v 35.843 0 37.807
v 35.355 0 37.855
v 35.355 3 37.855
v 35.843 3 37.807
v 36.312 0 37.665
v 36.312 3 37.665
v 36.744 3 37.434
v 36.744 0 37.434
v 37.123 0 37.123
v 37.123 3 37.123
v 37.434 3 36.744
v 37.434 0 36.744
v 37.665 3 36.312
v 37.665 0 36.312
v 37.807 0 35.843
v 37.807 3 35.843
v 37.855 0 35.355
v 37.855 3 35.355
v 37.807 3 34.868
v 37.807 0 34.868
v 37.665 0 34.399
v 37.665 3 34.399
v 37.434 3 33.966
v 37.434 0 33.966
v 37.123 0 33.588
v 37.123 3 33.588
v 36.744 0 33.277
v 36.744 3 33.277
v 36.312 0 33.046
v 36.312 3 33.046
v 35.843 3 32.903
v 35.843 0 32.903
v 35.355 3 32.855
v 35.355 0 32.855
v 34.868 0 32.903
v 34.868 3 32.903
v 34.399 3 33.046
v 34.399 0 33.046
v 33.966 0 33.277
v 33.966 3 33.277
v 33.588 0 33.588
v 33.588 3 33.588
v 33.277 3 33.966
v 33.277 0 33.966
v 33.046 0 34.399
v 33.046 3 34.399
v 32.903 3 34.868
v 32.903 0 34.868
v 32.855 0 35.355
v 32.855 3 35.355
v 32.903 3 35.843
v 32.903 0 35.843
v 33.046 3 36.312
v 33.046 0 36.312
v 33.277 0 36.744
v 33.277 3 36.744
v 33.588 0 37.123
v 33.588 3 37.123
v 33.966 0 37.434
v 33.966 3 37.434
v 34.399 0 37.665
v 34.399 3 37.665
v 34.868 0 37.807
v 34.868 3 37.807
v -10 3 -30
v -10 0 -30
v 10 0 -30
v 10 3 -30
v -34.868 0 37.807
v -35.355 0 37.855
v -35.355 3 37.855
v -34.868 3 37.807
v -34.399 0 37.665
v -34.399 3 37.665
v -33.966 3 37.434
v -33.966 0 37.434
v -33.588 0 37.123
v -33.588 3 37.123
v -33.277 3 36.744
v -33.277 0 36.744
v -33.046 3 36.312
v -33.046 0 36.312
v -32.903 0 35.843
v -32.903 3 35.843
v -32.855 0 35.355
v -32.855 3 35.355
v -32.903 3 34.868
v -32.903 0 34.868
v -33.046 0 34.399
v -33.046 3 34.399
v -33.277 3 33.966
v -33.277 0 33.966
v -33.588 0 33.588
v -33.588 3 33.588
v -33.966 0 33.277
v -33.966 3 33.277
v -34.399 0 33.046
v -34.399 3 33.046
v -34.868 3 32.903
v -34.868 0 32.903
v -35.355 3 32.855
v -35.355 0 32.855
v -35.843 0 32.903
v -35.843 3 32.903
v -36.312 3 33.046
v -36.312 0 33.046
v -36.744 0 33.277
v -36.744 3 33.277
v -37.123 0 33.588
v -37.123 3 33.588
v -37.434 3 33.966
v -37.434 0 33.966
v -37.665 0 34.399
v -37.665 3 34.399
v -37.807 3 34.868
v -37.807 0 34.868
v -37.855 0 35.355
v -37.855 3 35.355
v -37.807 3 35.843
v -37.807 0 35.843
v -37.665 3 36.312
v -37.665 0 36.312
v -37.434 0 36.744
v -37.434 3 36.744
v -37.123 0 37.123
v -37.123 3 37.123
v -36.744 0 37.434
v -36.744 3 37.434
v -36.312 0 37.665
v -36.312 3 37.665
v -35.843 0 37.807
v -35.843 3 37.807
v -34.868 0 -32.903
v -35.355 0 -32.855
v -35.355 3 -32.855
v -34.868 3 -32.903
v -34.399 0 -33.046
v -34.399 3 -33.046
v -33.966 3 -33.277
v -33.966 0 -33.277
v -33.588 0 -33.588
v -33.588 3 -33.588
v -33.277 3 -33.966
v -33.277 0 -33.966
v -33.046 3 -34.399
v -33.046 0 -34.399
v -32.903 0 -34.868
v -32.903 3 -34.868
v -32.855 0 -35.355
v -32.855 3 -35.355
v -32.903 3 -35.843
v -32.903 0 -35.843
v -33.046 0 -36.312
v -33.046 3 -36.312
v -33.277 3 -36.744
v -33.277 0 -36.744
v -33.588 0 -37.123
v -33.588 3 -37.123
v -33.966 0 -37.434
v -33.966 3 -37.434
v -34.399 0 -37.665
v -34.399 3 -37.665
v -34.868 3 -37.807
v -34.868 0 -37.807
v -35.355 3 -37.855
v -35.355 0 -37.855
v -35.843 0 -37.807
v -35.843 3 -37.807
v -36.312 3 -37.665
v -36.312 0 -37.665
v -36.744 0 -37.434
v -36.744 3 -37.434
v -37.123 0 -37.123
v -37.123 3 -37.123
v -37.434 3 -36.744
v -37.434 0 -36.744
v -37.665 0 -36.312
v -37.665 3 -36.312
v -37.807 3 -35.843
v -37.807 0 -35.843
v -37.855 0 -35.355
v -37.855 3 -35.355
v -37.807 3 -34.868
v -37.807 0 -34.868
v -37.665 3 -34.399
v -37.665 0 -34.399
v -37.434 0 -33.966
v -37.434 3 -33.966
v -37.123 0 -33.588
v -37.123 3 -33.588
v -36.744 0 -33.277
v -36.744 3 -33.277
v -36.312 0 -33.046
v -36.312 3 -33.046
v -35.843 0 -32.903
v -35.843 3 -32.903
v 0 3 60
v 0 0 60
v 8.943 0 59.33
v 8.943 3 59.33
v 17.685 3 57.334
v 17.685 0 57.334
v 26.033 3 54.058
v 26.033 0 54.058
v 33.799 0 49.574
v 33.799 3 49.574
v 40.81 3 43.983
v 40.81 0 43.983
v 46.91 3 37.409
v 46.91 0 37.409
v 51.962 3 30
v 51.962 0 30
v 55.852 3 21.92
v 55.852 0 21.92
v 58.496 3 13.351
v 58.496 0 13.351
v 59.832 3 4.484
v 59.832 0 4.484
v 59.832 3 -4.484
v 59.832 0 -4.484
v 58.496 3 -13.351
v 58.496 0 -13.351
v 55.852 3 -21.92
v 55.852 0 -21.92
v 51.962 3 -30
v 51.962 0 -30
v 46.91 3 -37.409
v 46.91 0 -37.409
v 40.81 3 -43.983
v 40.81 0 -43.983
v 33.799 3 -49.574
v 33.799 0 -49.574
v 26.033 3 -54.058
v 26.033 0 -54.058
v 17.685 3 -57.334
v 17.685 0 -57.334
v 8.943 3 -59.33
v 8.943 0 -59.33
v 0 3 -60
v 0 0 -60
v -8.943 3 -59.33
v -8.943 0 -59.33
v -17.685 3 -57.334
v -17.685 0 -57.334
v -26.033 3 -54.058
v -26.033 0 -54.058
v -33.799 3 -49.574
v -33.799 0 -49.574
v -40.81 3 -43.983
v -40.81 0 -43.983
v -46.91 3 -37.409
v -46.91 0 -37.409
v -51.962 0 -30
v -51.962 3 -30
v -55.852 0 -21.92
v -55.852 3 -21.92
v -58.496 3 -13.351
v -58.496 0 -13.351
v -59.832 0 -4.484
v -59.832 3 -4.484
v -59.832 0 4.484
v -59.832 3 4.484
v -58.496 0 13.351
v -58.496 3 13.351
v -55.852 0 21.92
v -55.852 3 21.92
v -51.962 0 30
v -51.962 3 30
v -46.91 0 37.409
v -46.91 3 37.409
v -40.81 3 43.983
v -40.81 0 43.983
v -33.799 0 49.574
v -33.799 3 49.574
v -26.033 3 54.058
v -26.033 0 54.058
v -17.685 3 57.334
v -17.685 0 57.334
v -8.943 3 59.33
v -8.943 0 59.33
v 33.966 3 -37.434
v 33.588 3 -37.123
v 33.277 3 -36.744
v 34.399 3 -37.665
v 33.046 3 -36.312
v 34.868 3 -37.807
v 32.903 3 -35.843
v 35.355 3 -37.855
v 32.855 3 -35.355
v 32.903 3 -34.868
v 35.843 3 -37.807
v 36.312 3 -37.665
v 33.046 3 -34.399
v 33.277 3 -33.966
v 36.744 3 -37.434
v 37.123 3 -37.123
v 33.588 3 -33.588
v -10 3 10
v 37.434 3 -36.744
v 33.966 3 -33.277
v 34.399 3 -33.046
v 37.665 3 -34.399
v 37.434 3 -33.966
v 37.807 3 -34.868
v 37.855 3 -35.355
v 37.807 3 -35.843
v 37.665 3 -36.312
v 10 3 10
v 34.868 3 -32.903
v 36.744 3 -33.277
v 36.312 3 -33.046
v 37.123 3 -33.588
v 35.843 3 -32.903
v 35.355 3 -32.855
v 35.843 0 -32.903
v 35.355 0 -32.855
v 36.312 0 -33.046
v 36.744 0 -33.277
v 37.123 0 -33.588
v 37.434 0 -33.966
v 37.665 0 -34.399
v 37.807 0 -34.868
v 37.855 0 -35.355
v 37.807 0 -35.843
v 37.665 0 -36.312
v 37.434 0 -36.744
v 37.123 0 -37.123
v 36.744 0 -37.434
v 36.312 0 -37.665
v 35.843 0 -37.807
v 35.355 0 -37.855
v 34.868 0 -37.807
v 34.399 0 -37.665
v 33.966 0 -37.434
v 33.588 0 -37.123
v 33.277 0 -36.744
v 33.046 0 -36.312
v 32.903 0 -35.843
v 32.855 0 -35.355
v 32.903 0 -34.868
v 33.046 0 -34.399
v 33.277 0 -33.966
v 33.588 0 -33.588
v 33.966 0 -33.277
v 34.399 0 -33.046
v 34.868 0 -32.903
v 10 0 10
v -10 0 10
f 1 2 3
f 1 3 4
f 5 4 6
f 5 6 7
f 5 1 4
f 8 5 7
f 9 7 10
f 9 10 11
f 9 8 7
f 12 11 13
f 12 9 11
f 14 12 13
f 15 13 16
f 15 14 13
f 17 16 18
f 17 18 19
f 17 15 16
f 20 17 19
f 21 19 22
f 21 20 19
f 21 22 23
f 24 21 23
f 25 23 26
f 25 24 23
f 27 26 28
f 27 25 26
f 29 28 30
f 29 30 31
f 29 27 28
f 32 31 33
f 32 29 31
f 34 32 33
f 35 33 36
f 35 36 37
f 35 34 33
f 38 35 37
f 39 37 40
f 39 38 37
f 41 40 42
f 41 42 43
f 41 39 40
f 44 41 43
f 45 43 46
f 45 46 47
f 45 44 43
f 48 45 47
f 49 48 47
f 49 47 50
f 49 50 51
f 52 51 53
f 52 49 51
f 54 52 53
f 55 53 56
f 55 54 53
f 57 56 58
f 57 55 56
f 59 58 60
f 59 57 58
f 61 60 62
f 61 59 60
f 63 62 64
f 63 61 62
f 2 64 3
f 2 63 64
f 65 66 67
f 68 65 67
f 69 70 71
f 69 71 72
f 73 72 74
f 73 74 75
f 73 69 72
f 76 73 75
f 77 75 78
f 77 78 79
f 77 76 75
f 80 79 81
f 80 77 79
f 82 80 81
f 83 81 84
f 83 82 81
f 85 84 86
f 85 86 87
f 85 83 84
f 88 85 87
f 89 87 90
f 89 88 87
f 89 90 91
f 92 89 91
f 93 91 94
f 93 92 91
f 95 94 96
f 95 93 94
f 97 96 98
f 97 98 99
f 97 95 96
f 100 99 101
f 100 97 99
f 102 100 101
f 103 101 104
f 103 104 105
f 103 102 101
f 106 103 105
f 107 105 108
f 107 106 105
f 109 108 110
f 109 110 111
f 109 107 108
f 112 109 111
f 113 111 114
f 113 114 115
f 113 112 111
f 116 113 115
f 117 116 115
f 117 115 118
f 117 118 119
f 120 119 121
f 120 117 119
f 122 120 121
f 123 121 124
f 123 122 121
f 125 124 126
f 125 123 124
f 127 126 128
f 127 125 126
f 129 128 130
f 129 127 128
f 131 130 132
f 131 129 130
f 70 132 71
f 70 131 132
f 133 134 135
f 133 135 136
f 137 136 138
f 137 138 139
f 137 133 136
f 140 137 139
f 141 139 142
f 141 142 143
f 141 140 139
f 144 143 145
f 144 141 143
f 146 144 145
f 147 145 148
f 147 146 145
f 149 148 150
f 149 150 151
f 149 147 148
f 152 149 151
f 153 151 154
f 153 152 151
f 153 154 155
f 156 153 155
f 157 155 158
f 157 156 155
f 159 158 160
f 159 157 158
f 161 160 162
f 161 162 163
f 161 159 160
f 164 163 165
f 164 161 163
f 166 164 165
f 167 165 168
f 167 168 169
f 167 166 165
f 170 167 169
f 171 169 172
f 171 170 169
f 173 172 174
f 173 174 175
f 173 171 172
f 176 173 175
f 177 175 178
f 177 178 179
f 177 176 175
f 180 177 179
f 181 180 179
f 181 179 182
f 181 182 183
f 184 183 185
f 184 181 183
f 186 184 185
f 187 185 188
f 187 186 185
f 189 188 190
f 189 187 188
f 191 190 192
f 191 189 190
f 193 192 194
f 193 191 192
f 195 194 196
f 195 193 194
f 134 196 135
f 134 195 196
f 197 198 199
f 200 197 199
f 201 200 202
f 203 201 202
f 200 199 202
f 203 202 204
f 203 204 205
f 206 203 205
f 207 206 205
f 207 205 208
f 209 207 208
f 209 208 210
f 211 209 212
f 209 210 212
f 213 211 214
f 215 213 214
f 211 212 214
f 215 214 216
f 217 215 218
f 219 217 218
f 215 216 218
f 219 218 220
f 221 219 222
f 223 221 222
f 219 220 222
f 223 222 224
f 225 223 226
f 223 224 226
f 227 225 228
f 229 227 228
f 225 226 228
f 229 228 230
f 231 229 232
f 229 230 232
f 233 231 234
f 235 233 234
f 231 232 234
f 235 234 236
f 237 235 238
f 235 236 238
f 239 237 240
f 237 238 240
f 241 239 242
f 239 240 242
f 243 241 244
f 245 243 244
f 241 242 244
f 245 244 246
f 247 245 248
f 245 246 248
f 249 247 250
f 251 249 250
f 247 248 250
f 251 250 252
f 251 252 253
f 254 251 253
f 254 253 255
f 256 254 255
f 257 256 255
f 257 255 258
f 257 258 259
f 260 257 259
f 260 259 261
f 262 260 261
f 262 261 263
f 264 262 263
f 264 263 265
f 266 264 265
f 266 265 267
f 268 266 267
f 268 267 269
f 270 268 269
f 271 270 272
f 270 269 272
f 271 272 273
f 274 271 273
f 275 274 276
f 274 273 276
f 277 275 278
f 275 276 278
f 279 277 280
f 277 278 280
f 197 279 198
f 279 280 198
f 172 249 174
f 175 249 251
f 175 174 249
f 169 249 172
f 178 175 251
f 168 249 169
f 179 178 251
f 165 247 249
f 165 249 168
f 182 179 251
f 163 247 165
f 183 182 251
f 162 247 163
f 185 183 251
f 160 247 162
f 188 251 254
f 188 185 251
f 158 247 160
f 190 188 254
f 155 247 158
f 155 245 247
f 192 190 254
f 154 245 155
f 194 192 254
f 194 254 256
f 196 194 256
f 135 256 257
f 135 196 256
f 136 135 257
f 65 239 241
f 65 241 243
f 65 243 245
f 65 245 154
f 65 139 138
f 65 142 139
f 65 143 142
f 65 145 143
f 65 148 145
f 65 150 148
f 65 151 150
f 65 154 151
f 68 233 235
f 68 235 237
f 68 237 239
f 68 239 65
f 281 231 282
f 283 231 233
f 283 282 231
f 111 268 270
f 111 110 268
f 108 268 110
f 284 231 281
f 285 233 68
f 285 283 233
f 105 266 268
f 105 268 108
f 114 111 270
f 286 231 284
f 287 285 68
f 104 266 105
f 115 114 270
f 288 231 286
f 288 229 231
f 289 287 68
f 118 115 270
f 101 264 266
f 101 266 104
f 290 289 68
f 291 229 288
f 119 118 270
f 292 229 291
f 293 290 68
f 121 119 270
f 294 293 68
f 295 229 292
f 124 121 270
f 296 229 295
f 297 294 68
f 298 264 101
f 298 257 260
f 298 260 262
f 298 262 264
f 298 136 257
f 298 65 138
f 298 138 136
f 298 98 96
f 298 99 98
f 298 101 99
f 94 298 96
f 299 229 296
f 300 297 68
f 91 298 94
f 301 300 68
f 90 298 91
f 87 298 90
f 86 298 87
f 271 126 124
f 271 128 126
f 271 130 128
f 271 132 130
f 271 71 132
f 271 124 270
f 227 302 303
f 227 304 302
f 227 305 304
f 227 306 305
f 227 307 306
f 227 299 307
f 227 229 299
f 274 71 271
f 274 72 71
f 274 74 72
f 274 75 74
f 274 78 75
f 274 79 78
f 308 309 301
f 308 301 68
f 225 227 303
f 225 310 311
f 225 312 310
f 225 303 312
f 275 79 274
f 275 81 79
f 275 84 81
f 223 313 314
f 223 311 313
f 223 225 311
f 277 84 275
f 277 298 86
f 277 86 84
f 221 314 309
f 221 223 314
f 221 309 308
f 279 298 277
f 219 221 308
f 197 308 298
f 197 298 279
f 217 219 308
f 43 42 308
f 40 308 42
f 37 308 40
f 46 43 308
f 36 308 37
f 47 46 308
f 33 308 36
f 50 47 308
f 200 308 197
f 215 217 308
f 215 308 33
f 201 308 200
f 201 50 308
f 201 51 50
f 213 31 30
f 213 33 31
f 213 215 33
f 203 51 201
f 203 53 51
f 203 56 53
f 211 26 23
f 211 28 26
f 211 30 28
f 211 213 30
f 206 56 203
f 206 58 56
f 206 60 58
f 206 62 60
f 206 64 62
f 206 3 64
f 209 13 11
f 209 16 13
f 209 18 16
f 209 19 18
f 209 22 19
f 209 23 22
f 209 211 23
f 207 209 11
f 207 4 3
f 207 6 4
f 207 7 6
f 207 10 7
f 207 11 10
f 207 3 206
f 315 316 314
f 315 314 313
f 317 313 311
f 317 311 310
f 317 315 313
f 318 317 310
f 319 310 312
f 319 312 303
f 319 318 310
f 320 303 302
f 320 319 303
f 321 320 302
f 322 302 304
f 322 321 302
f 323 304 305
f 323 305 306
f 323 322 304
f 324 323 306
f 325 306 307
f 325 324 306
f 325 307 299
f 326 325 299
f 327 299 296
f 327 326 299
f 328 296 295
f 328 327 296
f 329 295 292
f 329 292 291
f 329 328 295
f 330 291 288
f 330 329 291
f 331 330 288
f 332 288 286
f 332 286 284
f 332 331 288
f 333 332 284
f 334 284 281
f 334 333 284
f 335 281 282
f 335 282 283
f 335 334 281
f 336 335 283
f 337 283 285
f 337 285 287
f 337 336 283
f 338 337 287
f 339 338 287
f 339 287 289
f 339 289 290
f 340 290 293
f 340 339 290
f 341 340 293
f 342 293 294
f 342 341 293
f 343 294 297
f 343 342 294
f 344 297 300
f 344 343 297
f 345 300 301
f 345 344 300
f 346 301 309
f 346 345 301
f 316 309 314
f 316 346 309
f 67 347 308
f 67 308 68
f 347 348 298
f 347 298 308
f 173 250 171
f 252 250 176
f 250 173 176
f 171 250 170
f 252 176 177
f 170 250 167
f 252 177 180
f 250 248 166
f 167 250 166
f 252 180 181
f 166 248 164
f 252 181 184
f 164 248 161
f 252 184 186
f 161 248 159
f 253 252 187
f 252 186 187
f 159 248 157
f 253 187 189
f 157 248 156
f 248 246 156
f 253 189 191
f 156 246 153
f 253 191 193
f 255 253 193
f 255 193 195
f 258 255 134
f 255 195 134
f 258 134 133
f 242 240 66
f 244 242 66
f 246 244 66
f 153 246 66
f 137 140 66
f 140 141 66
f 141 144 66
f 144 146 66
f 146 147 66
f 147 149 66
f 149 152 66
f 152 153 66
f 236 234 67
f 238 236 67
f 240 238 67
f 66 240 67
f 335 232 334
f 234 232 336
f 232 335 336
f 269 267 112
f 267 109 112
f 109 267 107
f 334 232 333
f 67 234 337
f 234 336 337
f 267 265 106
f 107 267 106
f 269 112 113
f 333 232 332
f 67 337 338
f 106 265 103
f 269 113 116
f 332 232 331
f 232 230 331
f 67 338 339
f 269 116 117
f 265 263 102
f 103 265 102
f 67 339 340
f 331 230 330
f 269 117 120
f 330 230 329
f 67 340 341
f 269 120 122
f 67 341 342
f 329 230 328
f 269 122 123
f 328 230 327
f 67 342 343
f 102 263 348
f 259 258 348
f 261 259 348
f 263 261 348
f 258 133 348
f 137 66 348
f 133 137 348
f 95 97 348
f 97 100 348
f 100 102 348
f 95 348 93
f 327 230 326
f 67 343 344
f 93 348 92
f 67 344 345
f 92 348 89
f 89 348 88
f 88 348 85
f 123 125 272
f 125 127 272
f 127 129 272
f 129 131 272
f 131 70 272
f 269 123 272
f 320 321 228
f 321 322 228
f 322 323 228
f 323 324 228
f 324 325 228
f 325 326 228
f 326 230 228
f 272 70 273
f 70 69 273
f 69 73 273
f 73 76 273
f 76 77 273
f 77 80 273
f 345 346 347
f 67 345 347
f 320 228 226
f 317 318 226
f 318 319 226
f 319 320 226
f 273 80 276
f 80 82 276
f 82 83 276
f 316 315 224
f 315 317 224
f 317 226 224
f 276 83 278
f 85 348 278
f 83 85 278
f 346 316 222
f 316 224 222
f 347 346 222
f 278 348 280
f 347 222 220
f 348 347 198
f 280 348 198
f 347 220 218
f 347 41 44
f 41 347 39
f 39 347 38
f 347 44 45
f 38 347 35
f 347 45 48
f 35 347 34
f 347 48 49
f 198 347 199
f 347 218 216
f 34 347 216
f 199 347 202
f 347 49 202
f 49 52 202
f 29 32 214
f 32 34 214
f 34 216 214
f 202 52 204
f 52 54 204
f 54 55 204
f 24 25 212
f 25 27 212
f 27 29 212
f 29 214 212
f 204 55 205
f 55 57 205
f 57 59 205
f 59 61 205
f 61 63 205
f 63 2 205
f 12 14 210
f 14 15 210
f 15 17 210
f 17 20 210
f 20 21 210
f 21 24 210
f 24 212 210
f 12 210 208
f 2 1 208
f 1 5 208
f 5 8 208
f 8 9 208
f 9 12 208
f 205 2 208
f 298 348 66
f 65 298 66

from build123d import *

# Parameters (mm, degrees)
SKETCH_1_R      = 60
SKETCH_1_R_2    = 2.5
SKETCH_1_W      = 20
SKETCH_1_H      = 40
EXTRUDE_1_DEPTH = 3


with BuildPart() as part:
    # 草图1 → 凸台-拉伸1 (new body)
    with BuildSketch(Plane(origin=(0, 0, 0), x_dir=(1, 0, 0), z_dir=(0, 1, 0))):
        with Locations(Location((0, 0, 0), (0, 0, 270))):
            Circle(SKETCH_1_R)
        with Locations(Location((-35.355339059, 35.355339059, 0), (0, 0, 270))):
            Circle(SKETCH_1_R_2, mode=Mode.SUBTRACT)
        with Locations(Location((35.355339059, 35.355339059, 0), (0, 0, 270))):
            Circle(SKETCH_1_R_2, mode=Mode.SUBTRACT)
        with Locations(Location((35.355339059, -35.355339059, 0), (0, 0, 270))):
            Circle(SKETCH_1_R_2, mode=Mode.SUBTRACT)
        with Locations(Location((-35.355339059, -35.355339059, 0), (0, 0, 270))):
            Circle(SKETCH_1_R_2, mode=Mode.SUBTRACT)
        with Locations((0, 10)):
            Rectangle(SKETCH_1_W, SKETCH_1_H, mode=Mode.SUBTRACT)
    extrude(amount=EXTRUDE_1_DEPTH)


solid = part.part
